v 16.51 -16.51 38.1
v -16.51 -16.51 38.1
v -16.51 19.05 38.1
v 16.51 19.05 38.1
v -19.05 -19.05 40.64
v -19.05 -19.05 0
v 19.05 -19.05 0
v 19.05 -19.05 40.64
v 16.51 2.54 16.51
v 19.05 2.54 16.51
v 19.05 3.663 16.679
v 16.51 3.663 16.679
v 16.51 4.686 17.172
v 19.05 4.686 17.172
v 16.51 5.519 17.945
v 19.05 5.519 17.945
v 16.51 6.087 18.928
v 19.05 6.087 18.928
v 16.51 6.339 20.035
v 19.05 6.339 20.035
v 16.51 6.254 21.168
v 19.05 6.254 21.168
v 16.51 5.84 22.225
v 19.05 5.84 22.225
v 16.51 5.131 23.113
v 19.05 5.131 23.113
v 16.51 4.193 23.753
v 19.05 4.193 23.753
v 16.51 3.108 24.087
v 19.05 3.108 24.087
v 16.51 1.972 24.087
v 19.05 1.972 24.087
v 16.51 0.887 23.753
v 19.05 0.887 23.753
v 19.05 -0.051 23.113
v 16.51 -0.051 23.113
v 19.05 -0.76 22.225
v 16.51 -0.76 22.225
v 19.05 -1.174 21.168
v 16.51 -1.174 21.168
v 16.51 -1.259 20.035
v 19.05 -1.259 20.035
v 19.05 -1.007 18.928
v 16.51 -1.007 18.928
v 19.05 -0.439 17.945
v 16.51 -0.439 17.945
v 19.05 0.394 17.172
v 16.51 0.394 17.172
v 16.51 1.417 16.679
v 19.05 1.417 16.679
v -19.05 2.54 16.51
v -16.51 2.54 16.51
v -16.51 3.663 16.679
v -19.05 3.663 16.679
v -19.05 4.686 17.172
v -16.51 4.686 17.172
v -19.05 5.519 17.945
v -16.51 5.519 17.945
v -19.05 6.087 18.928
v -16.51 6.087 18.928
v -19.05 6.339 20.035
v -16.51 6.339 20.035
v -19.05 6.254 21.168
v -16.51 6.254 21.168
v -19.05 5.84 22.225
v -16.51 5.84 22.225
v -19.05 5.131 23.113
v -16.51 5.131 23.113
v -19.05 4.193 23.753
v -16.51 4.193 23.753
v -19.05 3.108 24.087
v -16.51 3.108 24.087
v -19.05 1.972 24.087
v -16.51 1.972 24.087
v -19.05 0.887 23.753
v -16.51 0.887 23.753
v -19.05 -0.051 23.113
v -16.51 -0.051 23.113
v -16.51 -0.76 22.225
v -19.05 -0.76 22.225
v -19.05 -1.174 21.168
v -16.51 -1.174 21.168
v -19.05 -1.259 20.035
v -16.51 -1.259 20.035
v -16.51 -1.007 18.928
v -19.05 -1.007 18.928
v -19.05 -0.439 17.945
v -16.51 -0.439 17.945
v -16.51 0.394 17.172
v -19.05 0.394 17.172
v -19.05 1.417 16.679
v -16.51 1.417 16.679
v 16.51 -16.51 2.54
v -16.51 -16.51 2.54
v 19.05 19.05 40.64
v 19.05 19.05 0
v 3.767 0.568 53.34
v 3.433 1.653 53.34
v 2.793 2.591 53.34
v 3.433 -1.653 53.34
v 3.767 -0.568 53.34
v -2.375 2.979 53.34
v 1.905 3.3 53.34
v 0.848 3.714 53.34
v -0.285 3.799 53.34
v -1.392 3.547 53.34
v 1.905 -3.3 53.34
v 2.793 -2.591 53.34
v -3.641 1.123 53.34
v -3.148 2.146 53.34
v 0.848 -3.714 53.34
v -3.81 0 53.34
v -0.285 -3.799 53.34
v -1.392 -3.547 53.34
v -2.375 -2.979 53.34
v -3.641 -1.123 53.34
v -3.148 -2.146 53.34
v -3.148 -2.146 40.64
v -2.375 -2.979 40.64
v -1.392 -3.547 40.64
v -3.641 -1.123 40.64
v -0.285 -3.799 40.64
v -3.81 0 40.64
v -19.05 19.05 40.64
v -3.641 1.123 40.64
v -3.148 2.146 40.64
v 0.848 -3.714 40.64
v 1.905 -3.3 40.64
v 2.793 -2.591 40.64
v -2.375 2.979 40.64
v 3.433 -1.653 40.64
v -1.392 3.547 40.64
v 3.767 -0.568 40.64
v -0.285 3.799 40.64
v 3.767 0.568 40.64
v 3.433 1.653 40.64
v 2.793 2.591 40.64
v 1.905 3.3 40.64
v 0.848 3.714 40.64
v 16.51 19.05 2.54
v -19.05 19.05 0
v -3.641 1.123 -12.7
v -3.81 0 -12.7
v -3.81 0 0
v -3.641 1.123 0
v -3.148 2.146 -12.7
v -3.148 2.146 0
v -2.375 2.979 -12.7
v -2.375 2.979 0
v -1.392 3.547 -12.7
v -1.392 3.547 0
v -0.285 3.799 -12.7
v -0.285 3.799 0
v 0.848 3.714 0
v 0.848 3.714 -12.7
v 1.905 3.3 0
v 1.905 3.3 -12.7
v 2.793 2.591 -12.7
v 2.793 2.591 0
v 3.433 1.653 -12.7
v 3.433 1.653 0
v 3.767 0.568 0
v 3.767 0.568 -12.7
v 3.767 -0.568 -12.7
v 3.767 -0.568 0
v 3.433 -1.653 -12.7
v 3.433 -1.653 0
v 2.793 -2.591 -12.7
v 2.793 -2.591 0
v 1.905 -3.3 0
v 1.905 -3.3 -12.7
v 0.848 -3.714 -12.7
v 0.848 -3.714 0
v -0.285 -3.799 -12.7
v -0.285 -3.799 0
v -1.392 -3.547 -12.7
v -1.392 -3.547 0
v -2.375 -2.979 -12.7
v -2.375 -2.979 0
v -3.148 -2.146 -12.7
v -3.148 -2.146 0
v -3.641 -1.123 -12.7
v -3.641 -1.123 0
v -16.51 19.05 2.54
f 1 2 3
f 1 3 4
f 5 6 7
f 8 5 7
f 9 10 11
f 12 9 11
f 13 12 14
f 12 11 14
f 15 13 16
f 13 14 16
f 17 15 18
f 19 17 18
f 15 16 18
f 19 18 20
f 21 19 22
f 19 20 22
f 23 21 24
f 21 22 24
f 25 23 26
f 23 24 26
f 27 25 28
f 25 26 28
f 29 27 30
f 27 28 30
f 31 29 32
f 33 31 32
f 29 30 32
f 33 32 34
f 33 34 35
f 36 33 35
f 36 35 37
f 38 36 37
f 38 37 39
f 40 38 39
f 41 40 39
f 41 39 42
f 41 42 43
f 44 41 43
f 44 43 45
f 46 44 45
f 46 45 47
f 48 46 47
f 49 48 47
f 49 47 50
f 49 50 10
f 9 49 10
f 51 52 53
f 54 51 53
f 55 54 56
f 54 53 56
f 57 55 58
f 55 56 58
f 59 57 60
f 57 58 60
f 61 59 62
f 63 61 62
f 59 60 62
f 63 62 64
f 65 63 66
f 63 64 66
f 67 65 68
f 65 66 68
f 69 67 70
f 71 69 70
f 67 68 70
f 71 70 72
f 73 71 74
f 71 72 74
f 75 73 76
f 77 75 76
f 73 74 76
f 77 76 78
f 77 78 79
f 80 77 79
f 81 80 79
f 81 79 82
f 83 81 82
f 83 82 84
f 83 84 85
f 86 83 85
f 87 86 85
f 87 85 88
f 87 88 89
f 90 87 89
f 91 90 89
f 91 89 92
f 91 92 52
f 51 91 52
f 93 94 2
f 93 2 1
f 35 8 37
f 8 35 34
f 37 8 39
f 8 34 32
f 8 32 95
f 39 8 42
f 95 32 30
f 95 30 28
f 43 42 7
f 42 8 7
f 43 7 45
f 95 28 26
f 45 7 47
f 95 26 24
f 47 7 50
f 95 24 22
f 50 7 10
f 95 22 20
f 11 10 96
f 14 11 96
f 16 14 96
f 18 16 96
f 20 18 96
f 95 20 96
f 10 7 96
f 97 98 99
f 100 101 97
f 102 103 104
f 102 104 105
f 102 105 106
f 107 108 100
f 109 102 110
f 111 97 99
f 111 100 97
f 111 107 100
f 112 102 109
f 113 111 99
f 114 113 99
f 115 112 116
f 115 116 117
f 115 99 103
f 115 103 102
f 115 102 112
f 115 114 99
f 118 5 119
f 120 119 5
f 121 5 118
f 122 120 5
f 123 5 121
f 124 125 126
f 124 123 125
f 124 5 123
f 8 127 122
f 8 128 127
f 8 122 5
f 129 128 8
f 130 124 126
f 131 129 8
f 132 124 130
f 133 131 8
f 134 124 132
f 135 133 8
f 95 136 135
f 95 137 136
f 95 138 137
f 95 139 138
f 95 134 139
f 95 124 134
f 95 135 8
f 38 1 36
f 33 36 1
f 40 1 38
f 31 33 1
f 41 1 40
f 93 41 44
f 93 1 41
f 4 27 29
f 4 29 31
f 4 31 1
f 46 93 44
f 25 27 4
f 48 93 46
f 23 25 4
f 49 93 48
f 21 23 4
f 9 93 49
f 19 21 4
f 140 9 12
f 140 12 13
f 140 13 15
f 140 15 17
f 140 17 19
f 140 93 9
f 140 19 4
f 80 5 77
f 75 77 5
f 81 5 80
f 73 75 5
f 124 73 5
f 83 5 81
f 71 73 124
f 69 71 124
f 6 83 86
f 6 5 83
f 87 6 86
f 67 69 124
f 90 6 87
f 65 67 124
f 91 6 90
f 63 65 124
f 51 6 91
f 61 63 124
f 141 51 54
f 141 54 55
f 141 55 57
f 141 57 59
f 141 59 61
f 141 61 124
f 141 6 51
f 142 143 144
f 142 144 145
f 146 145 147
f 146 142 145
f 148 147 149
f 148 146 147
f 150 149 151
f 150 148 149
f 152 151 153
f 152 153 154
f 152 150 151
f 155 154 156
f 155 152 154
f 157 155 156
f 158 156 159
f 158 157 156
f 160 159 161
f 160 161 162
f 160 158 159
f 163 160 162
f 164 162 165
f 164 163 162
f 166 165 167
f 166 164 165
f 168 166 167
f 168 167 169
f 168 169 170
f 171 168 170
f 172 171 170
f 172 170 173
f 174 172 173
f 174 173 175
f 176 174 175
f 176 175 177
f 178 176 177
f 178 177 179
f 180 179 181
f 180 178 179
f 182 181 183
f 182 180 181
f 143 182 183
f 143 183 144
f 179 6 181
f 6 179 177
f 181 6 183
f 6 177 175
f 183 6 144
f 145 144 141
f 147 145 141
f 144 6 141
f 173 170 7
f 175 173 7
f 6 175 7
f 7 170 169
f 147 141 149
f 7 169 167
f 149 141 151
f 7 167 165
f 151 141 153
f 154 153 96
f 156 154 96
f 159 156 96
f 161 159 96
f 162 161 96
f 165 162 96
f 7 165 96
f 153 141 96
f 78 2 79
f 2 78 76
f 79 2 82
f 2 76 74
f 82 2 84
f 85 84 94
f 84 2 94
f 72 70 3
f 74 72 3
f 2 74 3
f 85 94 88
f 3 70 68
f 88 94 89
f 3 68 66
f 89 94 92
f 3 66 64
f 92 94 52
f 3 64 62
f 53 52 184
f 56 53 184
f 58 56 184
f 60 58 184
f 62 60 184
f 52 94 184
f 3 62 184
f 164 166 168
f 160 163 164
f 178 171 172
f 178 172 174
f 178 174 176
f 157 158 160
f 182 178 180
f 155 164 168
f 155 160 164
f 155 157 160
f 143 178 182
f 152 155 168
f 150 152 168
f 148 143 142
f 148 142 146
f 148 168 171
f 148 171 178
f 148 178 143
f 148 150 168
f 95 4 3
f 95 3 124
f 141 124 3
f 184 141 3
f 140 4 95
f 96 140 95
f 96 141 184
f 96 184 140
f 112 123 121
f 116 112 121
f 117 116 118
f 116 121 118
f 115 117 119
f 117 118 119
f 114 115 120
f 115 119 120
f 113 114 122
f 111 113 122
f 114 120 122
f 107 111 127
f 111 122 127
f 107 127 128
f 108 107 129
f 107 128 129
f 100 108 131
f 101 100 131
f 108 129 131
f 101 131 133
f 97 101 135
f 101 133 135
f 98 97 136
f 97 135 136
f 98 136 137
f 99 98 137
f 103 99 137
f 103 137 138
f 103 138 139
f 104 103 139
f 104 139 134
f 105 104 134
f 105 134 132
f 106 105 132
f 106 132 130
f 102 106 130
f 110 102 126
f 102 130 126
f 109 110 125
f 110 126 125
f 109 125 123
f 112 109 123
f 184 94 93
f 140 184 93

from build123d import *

# Parameters (mm, degrees)
SKETCH1_W          = 38.1
SKETCH1_H          = 38.1
MAIN_BODY_DEPTH    = 40.64
HOLLOW_IT_T        = -2.54
SKETCH3_R          = 3.81
NIBBLE_NO_1_DEPTH  = 12.7
NIBBLE_START       = 12.7
SKETCH4_R          = 3.81
NIBBLE_NO_2_DEPTH  = 12.7
SKETCH5_W          = 1.27
SKETCH5_H          = 3.81
FLAG_DEPTH         = 0.254
SKETCH2_R          = 3.81
NIBBLE_HOLES_DEPTH = 69.261761624


with BuildPart() as part:
    # Sketch1 → main body (new body)
    with BuildSketch(Plane.XY):
        Rectangle(SKETCH1_W, SKETCH1_H)
    extrude(amount=MAIN_BODY_DEPTH)

    # hollow it
    hollow_it_openings = [part.faces().sort_by_distance(p)[0] for p in [
        (0, 19.05, 20.32),
    ]]
    offset(amount=HOLLOW_IT_T, openings=hollow_it_openings, kind=Kind.INTERSECTION)

    # Sketch3 → nibble no 1 (add)
    with BuildSketch(Plane.XY.offset(40.64)):
        with Locations(Location((0, 0, 0), (0, 0, 180))):
            Circle(SKETCH3_R)
    extrude(amount=NIBBLE_NO_1_DEPTH)

    # Sketch4 → nibble no 2 (add)
    with BuildSketch(Plane(origin=(0, 0, 0), x_dir=(-1, 0, 0), z_dir=(0, 0, -1)).offset(NIBBLE_START)):
        Circle(SKETCH4_R)
    extrude(amount=-NIBBLE_NO_2_DEPTH)

    # Sketch5 → flag (add)
    with BuildSketch(Plane(origin=(0, 0, 0), x_dir=(-1, 0, 0), z_dir=(0, -1, 0))):
        with Locations((-0.18666561, 6.353298227)):
            Rectangle(SKETCH5_W, SKETCH5_H)
    extrude(amount=FLAG_DEPTH)

    # Sketch2 → nibble holes (cut, through all)
    with BuildSketch(Plane(origin=(19.05, 0, 0), x_dir=(0, 0, -1), z_dir=(1, 0, 0))):
        with Locations((-20.32, 2.54)):
            Circle(SKETCH2_R)
    extrude(amount=-NIBBLE_HOLES_DEPTH, mode=Mode.SUBTRACT)


solid = part.part
